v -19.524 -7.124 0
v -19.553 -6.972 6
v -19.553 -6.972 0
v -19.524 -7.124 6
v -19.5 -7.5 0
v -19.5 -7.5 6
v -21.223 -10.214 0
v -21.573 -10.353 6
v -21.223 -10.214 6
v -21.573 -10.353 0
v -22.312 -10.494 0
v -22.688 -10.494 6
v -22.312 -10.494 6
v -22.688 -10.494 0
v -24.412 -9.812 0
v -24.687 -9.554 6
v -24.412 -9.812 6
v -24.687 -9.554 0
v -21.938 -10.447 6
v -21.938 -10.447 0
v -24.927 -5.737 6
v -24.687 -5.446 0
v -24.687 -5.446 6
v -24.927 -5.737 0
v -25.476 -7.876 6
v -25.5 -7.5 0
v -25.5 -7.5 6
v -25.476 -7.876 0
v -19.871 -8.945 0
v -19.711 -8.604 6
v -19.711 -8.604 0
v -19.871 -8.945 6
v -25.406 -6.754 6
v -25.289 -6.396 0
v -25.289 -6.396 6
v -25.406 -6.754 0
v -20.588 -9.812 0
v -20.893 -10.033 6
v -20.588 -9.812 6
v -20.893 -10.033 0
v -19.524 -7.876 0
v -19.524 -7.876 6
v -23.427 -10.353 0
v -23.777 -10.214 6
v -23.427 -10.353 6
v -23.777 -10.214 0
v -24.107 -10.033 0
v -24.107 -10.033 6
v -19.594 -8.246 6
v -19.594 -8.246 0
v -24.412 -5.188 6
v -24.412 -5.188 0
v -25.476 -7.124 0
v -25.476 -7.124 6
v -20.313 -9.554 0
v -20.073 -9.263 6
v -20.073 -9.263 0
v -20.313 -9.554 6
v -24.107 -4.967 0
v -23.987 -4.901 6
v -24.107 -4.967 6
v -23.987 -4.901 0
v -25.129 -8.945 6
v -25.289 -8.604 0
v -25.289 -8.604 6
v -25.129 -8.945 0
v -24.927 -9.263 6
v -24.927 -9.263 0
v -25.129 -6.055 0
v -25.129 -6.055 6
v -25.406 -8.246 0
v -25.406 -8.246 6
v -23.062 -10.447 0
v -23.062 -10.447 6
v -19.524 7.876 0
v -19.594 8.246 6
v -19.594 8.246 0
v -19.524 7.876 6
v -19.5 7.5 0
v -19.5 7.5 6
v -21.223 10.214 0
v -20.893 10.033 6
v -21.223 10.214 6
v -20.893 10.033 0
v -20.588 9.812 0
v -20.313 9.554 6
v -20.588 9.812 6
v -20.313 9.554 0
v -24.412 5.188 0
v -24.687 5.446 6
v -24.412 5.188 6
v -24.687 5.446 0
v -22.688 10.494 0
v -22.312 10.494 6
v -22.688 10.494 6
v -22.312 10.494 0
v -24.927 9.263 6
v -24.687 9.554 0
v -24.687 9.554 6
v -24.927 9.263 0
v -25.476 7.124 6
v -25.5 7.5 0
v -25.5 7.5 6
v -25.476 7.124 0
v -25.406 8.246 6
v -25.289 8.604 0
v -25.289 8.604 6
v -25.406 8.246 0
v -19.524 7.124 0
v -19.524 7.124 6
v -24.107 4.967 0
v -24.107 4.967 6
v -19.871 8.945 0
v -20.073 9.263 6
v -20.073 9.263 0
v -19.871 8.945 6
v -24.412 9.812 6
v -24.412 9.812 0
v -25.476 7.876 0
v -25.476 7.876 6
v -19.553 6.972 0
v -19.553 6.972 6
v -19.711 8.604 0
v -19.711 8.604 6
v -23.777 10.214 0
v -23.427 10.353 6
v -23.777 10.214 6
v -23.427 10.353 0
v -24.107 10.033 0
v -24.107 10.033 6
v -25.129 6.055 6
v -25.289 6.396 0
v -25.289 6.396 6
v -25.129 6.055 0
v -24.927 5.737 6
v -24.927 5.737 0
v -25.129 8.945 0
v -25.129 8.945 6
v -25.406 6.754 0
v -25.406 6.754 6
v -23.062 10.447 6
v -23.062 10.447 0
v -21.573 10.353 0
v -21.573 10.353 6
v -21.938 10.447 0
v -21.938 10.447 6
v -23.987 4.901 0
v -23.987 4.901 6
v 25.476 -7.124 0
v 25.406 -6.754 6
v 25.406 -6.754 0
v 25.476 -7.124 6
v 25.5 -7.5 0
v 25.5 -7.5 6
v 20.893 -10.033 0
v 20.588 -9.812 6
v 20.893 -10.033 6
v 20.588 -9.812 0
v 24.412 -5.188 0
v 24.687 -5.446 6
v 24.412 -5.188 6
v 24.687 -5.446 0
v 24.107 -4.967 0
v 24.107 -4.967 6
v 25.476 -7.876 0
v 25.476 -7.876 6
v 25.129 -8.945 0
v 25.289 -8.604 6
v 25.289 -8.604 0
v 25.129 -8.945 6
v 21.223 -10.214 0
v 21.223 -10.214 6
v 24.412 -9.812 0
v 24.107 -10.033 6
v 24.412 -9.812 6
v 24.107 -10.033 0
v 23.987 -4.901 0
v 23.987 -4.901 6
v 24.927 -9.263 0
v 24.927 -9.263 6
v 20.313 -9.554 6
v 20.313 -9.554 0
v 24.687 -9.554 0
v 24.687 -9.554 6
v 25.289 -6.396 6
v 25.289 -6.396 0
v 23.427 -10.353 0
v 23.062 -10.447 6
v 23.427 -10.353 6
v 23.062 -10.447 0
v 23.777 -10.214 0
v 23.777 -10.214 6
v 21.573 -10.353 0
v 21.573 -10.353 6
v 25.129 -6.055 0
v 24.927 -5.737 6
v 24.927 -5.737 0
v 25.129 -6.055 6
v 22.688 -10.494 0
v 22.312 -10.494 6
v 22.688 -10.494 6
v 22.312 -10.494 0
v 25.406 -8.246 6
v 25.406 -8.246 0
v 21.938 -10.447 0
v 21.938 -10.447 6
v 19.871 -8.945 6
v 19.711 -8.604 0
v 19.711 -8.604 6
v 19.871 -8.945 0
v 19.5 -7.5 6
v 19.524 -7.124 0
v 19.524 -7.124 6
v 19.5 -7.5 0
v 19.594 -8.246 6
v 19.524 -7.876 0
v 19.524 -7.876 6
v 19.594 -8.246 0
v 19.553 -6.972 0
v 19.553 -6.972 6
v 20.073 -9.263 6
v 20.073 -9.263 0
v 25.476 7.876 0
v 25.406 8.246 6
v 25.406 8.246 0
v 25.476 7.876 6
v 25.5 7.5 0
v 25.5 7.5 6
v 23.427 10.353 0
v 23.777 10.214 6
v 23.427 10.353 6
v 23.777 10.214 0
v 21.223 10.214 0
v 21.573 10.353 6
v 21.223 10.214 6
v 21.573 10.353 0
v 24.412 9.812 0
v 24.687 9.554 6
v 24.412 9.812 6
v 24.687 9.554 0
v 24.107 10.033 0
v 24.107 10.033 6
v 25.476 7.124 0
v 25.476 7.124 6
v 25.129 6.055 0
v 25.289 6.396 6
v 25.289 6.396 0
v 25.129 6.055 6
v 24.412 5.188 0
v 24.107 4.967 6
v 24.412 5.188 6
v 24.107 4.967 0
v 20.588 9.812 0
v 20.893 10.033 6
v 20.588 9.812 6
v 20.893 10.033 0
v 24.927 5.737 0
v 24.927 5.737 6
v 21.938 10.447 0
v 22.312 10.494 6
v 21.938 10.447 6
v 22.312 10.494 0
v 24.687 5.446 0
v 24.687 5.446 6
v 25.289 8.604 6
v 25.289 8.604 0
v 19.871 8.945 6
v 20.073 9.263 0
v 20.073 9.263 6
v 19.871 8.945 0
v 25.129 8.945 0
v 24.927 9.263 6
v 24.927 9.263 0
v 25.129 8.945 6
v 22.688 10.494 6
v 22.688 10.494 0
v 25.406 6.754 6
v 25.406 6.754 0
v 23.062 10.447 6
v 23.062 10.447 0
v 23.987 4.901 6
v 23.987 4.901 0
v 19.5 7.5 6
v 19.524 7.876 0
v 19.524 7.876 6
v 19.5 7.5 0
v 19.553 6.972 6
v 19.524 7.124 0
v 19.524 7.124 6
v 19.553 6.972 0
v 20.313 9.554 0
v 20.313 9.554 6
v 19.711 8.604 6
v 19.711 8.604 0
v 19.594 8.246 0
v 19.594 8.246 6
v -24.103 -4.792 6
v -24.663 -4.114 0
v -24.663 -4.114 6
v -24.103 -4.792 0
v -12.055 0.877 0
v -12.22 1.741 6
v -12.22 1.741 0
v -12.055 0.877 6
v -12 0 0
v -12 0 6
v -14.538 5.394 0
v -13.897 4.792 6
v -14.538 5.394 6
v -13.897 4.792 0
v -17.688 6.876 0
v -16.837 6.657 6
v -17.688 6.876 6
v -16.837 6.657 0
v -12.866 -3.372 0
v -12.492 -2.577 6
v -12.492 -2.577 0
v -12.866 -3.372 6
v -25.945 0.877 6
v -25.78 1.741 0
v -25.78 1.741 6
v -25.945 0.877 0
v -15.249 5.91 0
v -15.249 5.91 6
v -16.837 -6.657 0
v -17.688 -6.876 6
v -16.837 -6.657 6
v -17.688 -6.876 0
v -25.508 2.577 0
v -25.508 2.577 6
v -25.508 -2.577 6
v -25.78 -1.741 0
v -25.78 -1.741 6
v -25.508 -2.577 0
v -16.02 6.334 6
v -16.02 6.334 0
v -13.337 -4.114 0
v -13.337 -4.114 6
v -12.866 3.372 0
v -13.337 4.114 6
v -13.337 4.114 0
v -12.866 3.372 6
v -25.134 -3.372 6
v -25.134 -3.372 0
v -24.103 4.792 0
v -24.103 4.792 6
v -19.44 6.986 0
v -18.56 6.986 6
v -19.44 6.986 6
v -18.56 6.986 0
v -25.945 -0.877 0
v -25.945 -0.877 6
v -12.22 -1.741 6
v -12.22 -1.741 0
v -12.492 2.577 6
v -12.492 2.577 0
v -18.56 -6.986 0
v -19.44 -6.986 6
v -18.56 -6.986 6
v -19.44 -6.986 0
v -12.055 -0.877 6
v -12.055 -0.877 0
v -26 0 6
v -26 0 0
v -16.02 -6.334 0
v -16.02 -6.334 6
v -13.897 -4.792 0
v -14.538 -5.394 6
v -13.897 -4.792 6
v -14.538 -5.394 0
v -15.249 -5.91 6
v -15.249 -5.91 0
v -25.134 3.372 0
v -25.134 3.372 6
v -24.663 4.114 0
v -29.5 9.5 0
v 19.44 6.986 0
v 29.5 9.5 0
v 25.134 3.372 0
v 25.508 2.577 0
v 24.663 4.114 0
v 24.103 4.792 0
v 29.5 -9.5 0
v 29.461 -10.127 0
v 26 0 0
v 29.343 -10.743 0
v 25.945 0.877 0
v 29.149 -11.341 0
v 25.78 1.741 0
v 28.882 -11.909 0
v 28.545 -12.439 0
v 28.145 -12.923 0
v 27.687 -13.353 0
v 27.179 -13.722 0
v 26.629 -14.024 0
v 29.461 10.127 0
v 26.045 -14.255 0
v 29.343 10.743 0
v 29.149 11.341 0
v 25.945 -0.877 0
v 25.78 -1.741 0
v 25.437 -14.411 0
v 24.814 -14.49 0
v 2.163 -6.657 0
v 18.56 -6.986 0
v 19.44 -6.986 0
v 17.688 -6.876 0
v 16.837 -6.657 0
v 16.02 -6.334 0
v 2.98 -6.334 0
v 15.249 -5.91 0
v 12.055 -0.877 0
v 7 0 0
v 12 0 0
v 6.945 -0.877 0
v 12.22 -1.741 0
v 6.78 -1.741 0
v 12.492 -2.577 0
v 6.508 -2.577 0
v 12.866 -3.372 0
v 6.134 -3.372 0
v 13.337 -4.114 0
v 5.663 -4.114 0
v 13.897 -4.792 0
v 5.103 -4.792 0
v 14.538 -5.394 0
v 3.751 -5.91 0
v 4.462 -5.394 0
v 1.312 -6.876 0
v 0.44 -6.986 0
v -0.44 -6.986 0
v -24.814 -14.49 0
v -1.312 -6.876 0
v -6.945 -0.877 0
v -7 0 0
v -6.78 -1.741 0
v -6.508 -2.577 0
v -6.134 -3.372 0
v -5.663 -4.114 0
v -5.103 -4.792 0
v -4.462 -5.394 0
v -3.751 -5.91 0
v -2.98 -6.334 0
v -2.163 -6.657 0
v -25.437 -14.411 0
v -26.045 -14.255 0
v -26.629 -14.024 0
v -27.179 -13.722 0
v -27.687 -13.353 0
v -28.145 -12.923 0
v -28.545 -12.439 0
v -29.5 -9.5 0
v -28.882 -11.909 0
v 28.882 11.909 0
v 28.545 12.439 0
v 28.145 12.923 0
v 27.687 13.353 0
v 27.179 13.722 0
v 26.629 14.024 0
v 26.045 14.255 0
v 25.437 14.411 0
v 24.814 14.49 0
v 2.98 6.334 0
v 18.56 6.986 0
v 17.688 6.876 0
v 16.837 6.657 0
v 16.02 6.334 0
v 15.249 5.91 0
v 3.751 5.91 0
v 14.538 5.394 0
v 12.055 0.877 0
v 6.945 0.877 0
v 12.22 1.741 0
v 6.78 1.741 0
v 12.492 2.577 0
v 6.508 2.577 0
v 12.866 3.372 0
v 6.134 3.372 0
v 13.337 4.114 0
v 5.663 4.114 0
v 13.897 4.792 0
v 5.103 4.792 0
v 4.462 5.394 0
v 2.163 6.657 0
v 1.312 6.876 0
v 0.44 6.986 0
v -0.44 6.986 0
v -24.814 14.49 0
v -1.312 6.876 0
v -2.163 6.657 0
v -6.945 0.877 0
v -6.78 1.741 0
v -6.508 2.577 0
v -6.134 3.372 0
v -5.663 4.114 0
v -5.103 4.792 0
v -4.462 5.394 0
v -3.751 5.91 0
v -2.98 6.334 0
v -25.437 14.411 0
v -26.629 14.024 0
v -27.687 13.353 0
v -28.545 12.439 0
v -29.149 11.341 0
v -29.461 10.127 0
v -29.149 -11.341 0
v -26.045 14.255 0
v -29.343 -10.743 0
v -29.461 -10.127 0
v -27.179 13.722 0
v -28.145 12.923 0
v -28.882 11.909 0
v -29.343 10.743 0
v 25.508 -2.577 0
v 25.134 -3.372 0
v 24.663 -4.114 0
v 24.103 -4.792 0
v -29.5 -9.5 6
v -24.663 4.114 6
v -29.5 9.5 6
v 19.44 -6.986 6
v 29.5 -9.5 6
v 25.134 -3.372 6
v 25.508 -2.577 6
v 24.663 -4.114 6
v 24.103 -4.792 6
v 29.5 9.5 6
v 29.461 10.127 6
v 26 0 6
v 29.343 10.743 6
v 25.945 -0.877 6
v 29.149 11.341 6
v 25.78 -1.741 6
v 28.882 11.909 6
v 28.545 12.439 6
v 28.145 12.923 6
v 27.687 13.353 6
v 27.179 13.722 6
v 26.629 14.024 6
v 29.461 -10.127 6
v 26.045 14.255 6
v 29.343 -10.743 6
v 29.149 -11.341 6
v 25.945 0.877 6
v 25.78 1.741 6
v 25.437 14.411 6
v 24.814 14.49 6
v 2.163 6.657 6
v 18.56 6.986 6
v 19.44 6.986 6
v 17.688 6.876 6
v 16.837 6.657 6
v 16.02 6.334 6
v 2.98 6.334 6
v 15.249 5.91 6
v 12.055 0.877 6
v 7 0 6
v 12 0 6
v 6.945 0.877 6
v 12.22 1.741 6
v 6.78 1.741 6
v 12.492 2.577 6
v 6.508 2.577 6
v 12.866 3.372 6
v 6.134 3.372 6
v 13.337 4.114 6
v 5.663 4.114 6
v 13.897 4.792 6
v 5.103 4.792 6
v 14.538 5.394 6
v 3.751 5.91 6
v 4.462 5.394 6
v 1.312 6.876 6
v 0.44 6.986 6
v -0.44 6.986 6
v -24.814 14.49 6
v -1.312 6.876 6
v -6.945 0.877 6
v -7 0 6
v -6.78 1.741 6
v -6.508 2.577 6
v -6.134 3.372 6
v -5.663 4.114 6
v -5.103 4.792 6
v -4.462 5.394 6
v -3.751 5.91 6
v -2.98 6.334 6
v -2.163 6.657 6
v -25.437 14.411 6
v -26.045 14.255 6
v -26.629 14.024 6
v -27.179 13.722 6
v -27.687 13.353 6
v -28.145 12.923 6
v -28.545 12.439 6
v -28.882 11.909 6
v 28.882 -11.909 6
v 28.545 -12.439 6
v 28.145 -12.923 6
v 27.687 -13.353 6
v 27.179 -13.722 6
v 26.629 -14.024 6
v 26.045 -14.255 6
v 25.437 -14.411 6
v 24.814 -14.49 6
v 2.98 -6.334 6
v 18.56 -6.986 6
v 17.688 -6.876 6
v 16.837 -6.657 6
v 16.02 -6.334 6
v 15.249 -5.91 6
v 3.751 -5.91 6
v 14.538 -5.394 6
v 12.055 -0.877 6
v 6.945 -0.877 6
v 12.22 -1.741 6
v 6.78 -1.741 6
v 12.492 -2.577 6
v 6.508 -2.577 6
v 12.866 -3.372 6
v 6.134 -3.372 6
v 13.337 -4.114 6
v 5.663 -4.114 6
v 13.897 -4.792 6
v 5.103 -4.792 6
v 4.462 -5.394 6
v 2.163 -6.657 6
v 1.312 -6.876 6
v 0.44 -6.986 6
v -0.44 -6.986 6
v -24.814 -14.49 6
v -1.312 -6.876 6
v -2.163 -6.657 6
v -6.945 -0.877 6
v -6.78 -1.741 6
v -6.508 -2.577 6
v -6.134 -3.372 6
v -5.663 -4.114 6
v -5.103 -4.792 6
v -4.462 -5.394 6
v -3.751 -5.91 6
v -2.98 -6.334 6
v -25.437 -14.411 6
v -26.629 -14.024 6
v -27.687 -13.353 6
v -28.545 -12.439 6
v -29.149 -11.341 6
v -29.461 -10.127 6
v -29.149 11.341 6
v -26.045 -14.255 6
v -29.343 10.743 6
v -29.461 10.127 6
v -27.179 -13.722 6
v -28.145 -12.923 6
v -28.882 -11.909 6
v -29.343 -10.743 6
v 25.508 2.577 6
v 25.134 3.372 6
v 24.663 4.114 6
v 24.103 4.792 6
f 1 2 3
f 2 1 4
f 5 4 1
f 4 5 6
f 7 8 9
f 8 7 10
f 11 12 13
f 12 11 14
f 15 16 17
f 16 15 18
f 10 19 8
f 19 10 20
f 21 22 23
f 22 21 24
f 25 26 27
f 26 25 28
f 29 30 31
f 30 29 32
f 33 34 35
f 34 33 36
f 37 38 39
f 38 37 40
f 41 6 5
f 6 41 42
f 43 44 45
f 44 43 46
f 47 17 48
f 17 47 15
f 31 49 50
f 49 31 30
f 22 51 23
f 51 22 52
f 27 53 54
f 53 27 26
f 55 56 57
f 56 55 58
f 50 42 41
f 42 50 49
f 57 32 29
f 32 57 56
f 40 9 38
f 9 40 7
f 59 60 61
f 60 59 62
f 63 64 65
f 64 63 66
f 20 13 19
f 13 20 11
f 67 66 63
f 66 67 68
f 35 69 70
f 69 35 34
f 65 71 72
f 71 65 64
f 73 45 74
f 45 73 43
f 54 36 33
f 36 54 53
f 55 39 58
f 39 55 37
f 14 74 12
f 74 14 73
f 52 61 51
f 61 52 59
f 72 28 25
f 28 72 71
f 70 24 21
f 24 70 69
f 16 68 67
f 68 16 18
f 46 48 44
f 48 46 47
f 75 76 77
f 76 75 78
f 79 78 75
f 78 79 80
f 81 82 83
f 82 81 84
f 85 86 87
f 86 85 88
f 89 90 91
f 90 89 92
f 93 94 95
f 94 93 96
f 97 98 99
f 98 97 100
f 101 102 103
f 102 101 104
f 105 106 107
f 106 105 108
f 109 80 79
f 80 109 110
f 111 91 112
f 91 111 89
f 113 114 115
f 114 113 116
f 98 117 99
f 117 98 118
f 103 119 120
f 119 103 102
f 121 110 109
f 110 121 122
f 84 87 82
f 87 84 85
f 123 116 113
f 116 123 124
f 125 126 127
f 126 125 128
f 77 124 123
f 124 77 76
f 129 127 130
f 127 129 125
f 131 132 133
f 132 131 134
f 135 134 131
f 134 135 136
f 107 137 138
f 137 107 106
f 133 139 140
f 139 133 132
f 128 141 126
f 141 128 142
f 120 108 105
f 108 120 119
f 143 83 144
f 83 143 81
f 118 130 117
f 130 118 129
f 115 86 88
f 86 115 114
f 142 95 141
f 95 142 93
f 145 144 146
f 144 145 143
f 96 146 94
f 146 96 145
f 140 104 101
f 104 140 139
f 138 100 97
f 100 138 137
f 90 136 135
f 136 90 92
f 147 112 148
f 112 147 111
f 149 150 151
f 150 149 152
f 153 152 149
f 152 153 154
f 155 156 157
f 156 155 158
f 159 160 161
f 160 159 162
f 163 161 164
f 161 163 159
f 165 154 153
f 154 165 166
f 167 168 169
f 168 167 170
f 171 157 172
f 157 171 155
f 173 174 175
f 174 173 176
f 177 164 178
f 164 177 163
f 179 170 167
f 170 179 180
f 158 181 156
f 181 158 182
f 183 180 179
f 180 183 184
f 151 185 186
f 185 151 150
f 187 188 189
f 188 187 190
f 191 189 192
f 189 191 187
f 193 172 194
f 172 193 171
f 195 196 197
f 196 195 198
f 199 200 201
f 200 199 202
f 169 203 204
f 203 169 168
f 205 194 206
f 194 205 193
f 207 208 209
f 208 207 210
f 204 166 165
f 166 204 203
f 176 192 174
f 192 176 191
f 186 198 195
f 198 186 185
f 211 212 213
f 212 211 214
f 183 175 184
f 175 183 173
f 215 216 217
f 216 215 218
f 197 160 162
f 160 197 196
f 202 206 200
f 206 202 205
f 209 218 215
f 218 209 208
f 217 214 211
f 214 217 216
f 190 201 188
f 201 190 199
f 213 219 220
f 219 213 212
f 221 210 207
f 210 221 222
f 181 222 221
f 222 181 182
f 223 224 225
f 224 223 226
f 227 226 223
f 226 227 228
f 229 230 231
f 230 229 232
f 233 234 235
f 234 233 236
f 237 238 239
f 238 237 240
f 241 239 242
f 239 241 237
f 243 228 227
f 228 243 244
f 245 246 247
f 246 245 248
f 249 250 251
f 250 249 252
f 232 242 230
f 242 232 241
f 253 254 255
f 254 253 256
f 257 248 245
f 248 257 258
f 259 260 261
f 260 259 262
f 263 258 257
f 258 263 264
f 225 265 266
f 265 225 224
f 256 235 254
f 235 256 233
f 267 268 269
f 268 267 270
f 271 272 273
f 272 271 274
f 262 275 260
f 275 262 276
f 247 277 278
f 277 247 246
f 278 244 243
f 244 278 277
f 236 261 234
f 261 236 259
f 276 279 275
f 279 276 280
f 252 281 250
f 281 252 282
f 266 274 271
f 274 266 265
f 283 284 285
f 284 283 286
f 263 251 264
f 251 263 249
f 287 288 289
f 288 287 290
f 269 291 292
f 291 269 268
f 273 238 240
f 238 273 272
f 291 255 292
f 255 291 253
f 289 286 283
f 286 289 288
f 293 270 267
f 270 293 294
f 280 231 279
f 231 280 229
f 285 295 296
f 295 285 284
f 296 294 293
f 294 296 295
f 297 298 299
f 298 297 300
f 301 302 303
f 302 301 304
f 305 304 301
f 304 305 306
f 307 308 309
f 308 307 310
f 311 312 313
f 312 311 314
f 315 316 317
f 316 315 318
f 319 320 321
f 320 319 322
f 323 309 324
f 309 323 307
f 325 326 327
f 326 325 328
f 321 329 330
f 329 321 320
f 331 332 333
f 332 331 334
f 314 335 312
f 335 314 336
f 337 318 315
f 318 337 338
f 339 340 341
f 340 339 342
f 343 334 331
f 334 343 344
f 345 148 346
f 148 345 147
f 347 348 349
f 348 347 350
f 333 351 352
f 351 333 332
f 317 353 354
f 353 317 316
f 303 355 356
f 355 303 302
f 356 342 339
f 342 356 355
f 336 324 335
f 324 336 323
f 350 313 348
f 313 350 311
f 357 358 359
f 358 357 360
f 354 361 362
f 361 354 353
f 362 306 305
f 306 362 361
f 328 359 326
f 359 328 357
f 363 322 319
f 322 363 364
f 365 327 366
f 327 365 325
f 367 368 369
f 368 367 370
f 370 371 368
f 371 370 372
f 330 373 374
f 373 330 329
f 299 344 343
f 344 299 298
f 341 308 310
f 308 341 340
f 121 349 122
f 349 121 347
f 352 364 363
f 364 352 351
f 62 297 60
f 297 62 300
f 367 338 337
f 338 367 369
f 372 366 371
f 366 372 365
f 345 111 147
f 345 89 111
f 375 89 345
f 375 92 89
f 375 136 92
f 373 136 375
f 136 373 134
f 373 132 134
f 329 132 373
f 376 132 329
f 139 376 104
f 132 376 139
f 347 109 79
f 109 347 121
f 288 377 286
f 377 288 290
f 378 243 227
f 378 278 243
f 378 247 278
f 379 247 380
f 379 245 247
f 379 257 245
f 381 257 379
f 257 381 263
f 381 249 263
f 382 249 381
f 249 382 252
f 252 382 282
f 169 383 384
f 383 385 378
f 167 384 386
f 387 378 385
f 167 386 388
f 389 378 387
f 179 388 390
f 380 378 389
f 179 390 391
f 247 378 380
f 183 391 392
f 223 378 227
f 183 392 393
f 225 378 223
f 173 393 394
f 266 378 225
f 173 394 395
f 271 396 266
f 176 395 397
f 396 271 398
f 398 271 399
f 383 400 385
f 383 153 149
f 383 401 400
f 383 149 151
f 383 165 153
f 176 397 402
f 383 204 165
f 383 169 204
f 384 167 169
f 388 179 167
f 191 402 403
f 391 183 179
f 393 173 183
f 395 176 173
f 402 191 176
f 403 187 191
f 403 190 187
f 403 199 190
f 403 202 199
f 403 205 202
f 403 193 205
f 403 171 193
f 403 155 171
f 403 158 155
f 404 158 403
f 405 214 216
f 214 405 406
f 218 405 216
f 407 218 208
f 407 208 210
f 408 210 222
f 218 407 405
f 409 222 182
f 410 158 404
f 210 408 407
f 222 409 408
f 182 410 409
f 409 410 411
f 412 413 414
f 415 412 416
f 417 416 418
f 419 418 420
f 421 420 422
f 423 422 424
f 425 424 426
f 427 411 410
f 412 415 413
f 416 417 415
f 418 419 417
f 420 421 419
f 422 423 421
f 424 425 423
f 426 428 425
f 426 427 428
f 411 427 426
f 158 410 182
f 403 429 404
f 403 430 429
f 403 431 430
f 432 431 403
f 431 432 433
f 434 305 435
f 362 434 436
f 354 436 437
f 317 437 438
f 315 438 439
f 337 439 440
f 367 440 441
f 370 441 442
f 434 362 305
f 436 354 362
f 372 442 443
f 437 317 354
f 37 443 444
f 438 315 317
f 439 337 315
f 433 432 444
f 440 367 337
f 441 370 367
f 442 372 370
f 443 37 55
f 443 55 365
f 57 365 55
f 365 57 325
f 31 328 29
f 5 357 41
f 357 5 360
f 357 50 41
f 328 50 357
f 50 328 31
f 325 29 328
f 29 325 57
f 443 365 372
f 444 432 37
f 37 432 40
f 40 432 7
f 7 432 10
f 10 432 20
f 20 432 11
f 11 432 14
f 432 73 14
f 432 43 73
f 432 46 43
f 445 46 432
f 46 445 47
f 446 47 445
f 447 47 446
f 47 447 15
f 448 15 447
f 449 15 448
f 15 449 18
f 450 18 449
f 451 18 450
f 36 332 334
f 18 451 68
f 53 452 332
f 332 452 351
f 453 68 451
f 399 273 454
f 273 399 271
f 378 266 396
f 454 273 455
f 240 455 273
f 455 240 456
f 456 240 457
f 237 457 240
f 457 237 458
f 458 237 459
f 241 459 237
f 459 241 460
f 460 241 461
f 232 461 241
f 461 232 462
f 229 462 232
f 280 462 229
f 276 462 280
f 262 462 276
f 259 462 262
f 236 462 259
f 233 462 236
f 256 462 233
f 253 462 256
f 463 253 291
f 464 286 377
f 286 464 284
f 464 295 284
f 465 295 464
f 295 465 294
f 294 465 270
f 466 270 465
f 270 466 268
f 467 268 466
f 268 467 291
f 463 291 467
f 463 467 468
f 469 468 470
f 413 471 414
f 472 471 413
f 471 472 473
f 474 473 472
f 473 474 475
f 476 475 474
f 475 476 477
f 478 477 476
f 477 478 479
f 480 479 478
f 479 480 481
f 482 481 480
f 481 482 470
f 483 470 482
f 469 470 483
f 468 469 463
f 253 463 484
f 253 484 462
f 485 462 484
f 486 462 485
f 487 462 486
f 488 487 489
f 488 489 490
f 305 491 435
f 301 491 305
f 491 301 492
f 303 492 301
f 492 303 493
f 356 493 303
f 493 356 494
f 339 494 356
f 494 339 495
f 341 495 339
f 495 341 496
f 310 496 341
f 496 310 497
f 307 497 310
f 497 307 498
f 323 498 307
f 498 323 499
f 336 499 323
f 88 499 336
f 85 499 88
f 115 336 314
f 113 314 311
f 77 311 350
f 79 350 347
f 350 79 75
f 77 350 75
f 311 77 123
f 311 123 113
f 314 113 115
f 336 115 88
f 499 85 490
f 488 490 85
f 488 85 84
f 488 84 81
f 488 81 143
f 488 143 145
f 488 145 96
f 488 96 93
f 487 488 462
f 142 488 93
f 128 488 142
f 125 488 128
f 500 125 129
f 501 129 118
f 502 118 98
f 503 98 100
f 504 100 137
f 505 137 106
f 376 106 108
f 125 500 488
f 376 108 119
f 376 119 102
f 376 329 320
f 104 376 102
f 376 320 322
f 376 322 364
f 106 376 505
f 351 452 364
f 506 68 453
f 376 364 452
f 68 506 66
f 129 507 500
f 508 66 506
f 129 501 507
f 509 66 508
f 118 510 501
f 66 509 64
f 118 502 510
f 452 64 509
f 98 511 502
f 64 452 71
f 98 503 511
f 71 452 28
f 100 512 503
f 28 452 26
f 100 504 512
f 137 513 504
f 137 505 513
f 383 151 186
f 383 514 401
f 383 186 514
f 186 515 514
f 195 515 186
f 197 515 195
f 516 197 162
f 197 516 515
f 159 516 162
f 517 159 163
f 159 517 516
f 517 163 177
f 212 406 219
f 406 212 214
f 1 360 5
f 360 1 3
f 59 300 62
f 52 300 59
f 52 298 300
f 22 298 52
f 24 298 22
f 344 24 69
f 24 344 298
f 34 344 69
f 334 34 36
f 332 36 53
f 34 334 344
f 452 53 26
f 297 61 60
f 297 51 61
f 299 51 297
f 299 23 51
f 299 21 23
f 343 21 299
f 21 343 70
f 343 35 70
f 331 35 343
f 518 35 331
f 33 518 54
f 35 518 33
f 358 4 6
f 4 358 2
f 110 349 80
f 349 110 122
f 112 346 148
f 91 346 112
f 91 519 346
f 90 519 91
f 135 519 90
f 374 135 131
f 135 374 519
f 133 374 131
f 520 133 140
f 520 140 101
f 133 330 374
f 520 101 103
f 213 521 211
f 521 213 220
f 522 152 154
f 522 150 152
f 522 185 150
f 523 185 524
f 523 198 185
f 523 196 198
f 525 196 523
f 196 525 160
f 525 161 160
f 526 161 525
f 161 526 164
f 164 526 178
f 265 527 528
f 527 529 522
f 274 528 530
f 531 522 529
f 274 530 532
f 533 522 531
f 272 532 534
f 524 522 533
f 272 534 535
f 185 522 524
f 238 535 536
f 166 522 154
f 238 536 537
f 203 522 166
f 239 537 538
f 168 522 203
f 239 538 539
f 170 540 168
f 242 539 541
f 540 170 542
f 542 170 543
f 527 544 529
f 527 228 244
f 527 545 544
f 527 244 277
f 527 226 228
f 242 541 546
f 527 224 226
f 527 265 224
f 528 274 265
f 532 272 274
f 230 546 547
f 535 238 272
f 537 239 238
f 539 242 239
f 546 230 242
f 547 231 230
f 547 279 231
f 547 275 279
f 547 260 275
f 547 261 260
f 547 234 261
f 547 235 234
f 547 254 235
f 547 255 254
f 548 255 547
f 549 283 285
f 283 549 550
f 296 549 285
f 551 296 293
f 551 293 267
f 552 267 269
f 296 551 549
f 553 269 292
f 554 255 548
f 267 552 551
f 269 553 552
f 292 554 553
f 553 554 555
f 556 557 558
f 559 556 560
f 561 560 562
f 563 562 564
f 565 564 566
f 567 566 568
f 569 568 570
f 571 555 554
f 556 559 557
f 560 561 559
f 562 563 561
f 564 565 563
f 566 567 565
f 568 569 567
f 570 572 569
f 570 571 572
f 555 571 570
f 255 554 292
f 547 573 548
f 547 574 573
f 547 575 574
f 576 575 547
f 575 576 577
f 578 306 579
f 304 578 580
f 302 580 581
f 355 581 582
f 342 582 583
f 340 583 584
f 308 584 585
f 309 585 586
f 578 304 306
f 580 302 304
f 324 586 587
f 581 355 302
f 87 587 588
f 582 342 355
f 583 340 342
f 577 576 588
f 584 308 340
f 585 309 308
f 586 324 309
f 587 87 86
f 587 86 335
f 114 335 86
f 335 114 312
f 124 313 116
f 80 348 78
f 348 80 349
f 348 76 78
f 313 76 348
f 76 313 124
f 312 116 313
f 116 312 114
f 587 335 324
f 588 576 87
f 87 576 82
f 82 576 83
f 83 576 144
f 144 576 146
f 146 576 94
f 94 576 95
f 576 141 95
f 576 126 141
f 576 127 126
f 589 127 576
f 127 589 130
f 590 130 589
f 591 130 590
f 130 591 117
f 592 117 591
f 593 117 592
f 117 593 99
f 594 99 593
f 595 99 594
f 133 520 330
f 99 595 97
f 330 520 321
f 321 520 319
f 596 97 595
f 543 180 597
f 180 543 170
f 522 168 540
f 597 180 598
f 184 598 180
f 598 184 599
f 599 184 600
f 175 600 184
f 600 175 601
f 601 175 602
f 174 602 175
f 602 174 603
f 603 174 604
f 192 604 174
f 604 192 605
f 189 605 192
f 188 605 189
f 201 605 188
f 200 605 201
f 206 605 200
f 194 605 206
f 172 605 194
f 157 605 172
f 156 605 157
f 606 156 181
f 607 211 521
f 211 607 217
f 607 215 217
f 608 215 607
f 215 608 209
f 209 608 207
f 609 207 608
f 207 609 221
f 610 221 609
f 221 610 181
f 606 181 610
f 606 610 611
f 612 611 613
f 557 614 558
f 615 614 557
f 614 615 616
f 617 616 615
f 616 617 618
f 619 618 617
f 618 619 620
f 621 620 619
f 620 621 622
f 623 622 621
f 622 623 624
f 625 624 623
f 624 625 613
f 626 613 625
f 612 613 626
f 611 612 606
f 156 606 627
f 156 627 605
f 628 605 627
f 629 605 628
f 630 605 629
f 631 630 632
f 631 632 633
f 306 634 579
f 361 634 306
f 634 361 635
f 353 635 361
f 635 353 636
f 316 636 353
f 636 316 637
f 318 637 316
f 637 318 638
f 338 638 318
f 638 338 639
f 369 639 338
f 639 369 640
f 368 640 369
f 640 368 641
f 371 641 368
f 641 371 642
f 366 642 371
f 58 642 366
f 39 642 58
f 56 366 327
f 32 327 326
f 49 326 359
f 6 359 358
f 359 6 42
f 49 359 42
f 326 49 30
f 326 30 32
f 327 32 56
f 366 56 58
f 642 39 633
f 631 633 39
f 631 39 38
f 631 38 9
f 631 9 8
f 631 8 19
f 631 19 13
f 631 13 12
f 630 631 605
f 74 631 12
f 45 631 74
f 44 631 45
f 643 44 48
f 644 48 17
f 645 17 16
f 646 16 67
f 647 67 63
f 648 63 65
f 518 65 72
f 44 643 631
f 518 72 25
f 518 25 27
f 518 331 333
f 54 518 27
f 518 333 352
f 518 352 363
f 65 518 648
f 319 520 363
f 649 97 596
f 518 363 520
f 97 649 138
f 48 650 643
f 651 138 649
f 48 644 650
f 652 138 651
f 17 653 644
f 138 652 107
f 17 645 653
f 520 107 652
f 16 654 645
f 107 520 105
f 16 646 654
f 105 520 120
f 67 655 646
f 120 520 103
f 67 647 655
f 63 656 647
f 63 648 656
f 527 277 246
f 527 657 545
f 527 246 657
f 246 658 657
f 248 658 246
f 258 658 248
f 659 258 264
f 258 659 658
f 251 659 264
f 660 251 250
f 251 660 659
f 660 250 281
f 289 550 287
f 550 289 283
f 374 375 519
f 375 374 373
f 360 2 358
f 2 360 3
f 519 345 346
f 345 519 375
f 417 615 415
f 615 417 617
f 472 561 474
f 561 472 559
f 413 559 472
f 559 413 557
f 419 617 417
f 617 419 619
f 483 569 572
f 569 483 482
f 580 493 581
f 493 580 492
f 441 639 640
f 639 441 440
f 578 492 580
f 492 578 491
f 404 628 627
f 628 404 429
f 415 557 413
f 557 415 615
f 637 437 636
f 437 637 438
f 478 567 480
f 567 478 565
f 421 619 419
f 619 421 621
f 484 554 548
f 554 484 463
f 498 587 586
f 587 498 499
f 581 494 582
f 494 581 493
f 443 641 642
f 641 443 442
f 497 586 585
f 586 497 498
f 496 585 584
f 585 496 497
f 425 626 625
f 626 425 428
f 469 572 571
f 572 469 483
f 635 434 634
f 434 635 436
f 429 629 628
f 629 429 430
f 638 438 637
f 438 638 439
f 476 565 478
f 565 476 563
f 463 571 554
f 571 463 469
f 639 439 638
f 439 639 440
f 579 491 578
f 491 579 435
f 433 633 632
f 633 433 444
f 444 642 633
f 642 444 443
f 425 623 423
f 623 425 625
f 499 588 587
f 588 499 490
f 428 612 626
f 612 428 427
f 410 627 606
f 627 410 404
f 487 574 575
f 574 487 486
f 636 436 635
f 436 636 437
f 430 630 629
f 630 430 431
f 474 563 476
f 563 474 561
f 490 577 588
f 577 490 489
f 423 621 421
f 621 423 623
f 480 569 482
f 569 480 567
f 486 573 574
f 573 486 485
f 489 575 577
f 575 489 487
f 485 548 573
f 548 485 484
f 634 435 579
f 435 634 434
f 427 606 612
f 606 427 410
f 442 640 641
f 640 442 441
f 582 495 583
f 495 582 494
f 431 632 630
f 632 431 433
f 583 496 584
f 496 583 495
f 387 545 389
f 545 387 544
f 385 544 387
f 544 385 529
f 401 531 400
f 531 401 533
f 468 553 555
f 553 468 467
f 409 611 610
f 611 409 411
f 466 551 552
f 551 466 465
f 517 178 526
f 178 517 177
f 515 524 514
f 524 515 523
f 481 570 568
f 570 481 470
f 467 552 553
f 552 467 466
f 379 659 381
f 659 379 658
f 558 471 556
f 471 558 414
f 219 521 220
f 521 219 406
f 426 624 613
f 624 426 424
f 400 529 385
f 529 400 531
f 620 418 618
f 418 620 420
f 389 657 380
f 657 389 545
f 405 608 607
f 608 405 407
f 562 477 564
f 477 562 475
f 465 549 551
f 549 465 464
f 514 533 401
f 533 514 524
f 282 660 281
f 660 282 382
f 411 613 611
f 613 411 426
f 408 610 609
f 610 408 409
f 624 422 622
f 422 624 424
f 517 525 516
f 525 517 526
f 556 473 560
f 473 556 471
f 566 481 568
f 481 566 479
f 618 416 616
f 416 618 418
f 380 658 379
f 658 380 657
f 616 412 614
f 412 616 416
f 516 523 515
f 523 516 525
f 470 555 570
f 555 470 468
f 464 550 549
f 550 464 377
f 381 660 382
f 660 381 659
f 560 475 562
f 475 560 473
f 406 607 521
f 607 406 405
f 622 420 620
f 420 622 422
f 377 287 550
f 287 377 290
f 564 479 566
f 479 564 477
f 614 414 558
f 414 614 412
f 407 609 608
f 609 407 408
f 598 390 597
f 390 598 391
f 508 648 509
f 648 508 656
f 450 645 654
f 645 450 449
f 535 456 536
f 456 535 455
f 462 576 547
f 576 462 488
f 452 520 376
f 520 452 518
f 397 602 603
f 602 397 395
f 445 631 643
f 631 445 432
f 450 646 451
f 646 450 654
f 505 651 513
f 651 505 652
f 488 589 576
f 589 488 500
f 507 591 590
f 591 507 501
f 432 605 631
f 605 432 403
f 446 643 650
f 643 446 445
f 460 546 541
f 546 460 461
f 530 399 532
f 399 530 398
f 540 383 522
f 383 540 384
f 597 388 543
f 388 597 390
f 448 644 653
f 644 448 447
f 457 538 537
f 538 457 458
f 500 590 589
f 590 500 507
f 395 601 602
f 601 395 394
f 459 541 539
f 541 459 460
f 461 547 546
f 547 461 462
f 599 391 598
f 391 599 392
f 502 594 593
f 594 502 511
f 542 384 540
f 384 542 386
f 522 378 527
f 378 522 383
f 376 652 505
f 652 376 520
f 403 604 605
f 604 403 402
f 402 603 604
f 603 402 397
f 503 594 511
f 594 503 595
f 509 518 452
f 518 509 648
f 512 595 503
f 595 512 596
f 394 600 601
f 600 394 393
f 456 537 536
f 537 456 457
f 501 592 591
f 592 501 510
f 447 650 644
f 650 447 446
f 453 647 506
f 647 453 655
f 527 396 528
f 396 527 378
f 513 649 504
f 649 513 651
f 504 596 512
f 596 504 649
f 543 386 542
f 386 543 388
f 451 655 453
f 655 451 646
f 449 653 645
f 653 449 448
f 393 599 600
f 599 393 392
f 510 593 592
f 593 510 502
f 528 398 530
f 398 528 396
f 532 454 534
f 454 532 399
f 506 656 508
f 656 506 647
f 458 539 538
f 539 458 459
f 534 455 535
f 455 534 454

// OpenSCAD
$fn = 50;


difference() {
	union() {
		hull() {
			translate(v = [-24.5000000000, 9.5000000000, 0]) {
				cylinder(h = 6, r = 5);
			}
			translate(v = [24.5000000000, 9.5000000000, 0]) {
				cylinder(h = 6, r = 5);
			}
			translate(v = [-24.5000000000, -9.5000000000, 0]) {
				cylinder(h = 6, r = 5);
			}
			translate(v = [24.5000000000, -9.5000000000, 0]) {
				cylinder(h = 6, r = 5);
			}
		}
	}
	union() {
		#translate(v = [-22.5000000000, -7.5000000000, -100.0000000000]) {
			cylinder(h = 200, r = 3.0000000000);
		}
		#translate(v = [-22.5000000000, 7.5000000000, -100.0000000000]) {
			cylinder(h = 200, r = 3.0000000000);
		}
		#translate(v = [22.5000000000, -7.5000000000, -100.0000000000]) {
			cylinder(h = 200, r = 3.0000000000);
		}
		#translate(v = [22.5000000000, 7.5000000000, -100.0000000000]) {
			cylinder(h = 200, r = 3.0000000000);
		}
		#translate(v = [-19.0000000000, 0, 0]) {
			cylinder(h = 6, r = 7.0000000000);
		}
		#cylinder(h = 6, r = 7.0000000000);
		#translate(v = [19.0000000000, 0, 0]) {
			cylinder(h = 6, r = 7.0000000000);
		}
	}
}
